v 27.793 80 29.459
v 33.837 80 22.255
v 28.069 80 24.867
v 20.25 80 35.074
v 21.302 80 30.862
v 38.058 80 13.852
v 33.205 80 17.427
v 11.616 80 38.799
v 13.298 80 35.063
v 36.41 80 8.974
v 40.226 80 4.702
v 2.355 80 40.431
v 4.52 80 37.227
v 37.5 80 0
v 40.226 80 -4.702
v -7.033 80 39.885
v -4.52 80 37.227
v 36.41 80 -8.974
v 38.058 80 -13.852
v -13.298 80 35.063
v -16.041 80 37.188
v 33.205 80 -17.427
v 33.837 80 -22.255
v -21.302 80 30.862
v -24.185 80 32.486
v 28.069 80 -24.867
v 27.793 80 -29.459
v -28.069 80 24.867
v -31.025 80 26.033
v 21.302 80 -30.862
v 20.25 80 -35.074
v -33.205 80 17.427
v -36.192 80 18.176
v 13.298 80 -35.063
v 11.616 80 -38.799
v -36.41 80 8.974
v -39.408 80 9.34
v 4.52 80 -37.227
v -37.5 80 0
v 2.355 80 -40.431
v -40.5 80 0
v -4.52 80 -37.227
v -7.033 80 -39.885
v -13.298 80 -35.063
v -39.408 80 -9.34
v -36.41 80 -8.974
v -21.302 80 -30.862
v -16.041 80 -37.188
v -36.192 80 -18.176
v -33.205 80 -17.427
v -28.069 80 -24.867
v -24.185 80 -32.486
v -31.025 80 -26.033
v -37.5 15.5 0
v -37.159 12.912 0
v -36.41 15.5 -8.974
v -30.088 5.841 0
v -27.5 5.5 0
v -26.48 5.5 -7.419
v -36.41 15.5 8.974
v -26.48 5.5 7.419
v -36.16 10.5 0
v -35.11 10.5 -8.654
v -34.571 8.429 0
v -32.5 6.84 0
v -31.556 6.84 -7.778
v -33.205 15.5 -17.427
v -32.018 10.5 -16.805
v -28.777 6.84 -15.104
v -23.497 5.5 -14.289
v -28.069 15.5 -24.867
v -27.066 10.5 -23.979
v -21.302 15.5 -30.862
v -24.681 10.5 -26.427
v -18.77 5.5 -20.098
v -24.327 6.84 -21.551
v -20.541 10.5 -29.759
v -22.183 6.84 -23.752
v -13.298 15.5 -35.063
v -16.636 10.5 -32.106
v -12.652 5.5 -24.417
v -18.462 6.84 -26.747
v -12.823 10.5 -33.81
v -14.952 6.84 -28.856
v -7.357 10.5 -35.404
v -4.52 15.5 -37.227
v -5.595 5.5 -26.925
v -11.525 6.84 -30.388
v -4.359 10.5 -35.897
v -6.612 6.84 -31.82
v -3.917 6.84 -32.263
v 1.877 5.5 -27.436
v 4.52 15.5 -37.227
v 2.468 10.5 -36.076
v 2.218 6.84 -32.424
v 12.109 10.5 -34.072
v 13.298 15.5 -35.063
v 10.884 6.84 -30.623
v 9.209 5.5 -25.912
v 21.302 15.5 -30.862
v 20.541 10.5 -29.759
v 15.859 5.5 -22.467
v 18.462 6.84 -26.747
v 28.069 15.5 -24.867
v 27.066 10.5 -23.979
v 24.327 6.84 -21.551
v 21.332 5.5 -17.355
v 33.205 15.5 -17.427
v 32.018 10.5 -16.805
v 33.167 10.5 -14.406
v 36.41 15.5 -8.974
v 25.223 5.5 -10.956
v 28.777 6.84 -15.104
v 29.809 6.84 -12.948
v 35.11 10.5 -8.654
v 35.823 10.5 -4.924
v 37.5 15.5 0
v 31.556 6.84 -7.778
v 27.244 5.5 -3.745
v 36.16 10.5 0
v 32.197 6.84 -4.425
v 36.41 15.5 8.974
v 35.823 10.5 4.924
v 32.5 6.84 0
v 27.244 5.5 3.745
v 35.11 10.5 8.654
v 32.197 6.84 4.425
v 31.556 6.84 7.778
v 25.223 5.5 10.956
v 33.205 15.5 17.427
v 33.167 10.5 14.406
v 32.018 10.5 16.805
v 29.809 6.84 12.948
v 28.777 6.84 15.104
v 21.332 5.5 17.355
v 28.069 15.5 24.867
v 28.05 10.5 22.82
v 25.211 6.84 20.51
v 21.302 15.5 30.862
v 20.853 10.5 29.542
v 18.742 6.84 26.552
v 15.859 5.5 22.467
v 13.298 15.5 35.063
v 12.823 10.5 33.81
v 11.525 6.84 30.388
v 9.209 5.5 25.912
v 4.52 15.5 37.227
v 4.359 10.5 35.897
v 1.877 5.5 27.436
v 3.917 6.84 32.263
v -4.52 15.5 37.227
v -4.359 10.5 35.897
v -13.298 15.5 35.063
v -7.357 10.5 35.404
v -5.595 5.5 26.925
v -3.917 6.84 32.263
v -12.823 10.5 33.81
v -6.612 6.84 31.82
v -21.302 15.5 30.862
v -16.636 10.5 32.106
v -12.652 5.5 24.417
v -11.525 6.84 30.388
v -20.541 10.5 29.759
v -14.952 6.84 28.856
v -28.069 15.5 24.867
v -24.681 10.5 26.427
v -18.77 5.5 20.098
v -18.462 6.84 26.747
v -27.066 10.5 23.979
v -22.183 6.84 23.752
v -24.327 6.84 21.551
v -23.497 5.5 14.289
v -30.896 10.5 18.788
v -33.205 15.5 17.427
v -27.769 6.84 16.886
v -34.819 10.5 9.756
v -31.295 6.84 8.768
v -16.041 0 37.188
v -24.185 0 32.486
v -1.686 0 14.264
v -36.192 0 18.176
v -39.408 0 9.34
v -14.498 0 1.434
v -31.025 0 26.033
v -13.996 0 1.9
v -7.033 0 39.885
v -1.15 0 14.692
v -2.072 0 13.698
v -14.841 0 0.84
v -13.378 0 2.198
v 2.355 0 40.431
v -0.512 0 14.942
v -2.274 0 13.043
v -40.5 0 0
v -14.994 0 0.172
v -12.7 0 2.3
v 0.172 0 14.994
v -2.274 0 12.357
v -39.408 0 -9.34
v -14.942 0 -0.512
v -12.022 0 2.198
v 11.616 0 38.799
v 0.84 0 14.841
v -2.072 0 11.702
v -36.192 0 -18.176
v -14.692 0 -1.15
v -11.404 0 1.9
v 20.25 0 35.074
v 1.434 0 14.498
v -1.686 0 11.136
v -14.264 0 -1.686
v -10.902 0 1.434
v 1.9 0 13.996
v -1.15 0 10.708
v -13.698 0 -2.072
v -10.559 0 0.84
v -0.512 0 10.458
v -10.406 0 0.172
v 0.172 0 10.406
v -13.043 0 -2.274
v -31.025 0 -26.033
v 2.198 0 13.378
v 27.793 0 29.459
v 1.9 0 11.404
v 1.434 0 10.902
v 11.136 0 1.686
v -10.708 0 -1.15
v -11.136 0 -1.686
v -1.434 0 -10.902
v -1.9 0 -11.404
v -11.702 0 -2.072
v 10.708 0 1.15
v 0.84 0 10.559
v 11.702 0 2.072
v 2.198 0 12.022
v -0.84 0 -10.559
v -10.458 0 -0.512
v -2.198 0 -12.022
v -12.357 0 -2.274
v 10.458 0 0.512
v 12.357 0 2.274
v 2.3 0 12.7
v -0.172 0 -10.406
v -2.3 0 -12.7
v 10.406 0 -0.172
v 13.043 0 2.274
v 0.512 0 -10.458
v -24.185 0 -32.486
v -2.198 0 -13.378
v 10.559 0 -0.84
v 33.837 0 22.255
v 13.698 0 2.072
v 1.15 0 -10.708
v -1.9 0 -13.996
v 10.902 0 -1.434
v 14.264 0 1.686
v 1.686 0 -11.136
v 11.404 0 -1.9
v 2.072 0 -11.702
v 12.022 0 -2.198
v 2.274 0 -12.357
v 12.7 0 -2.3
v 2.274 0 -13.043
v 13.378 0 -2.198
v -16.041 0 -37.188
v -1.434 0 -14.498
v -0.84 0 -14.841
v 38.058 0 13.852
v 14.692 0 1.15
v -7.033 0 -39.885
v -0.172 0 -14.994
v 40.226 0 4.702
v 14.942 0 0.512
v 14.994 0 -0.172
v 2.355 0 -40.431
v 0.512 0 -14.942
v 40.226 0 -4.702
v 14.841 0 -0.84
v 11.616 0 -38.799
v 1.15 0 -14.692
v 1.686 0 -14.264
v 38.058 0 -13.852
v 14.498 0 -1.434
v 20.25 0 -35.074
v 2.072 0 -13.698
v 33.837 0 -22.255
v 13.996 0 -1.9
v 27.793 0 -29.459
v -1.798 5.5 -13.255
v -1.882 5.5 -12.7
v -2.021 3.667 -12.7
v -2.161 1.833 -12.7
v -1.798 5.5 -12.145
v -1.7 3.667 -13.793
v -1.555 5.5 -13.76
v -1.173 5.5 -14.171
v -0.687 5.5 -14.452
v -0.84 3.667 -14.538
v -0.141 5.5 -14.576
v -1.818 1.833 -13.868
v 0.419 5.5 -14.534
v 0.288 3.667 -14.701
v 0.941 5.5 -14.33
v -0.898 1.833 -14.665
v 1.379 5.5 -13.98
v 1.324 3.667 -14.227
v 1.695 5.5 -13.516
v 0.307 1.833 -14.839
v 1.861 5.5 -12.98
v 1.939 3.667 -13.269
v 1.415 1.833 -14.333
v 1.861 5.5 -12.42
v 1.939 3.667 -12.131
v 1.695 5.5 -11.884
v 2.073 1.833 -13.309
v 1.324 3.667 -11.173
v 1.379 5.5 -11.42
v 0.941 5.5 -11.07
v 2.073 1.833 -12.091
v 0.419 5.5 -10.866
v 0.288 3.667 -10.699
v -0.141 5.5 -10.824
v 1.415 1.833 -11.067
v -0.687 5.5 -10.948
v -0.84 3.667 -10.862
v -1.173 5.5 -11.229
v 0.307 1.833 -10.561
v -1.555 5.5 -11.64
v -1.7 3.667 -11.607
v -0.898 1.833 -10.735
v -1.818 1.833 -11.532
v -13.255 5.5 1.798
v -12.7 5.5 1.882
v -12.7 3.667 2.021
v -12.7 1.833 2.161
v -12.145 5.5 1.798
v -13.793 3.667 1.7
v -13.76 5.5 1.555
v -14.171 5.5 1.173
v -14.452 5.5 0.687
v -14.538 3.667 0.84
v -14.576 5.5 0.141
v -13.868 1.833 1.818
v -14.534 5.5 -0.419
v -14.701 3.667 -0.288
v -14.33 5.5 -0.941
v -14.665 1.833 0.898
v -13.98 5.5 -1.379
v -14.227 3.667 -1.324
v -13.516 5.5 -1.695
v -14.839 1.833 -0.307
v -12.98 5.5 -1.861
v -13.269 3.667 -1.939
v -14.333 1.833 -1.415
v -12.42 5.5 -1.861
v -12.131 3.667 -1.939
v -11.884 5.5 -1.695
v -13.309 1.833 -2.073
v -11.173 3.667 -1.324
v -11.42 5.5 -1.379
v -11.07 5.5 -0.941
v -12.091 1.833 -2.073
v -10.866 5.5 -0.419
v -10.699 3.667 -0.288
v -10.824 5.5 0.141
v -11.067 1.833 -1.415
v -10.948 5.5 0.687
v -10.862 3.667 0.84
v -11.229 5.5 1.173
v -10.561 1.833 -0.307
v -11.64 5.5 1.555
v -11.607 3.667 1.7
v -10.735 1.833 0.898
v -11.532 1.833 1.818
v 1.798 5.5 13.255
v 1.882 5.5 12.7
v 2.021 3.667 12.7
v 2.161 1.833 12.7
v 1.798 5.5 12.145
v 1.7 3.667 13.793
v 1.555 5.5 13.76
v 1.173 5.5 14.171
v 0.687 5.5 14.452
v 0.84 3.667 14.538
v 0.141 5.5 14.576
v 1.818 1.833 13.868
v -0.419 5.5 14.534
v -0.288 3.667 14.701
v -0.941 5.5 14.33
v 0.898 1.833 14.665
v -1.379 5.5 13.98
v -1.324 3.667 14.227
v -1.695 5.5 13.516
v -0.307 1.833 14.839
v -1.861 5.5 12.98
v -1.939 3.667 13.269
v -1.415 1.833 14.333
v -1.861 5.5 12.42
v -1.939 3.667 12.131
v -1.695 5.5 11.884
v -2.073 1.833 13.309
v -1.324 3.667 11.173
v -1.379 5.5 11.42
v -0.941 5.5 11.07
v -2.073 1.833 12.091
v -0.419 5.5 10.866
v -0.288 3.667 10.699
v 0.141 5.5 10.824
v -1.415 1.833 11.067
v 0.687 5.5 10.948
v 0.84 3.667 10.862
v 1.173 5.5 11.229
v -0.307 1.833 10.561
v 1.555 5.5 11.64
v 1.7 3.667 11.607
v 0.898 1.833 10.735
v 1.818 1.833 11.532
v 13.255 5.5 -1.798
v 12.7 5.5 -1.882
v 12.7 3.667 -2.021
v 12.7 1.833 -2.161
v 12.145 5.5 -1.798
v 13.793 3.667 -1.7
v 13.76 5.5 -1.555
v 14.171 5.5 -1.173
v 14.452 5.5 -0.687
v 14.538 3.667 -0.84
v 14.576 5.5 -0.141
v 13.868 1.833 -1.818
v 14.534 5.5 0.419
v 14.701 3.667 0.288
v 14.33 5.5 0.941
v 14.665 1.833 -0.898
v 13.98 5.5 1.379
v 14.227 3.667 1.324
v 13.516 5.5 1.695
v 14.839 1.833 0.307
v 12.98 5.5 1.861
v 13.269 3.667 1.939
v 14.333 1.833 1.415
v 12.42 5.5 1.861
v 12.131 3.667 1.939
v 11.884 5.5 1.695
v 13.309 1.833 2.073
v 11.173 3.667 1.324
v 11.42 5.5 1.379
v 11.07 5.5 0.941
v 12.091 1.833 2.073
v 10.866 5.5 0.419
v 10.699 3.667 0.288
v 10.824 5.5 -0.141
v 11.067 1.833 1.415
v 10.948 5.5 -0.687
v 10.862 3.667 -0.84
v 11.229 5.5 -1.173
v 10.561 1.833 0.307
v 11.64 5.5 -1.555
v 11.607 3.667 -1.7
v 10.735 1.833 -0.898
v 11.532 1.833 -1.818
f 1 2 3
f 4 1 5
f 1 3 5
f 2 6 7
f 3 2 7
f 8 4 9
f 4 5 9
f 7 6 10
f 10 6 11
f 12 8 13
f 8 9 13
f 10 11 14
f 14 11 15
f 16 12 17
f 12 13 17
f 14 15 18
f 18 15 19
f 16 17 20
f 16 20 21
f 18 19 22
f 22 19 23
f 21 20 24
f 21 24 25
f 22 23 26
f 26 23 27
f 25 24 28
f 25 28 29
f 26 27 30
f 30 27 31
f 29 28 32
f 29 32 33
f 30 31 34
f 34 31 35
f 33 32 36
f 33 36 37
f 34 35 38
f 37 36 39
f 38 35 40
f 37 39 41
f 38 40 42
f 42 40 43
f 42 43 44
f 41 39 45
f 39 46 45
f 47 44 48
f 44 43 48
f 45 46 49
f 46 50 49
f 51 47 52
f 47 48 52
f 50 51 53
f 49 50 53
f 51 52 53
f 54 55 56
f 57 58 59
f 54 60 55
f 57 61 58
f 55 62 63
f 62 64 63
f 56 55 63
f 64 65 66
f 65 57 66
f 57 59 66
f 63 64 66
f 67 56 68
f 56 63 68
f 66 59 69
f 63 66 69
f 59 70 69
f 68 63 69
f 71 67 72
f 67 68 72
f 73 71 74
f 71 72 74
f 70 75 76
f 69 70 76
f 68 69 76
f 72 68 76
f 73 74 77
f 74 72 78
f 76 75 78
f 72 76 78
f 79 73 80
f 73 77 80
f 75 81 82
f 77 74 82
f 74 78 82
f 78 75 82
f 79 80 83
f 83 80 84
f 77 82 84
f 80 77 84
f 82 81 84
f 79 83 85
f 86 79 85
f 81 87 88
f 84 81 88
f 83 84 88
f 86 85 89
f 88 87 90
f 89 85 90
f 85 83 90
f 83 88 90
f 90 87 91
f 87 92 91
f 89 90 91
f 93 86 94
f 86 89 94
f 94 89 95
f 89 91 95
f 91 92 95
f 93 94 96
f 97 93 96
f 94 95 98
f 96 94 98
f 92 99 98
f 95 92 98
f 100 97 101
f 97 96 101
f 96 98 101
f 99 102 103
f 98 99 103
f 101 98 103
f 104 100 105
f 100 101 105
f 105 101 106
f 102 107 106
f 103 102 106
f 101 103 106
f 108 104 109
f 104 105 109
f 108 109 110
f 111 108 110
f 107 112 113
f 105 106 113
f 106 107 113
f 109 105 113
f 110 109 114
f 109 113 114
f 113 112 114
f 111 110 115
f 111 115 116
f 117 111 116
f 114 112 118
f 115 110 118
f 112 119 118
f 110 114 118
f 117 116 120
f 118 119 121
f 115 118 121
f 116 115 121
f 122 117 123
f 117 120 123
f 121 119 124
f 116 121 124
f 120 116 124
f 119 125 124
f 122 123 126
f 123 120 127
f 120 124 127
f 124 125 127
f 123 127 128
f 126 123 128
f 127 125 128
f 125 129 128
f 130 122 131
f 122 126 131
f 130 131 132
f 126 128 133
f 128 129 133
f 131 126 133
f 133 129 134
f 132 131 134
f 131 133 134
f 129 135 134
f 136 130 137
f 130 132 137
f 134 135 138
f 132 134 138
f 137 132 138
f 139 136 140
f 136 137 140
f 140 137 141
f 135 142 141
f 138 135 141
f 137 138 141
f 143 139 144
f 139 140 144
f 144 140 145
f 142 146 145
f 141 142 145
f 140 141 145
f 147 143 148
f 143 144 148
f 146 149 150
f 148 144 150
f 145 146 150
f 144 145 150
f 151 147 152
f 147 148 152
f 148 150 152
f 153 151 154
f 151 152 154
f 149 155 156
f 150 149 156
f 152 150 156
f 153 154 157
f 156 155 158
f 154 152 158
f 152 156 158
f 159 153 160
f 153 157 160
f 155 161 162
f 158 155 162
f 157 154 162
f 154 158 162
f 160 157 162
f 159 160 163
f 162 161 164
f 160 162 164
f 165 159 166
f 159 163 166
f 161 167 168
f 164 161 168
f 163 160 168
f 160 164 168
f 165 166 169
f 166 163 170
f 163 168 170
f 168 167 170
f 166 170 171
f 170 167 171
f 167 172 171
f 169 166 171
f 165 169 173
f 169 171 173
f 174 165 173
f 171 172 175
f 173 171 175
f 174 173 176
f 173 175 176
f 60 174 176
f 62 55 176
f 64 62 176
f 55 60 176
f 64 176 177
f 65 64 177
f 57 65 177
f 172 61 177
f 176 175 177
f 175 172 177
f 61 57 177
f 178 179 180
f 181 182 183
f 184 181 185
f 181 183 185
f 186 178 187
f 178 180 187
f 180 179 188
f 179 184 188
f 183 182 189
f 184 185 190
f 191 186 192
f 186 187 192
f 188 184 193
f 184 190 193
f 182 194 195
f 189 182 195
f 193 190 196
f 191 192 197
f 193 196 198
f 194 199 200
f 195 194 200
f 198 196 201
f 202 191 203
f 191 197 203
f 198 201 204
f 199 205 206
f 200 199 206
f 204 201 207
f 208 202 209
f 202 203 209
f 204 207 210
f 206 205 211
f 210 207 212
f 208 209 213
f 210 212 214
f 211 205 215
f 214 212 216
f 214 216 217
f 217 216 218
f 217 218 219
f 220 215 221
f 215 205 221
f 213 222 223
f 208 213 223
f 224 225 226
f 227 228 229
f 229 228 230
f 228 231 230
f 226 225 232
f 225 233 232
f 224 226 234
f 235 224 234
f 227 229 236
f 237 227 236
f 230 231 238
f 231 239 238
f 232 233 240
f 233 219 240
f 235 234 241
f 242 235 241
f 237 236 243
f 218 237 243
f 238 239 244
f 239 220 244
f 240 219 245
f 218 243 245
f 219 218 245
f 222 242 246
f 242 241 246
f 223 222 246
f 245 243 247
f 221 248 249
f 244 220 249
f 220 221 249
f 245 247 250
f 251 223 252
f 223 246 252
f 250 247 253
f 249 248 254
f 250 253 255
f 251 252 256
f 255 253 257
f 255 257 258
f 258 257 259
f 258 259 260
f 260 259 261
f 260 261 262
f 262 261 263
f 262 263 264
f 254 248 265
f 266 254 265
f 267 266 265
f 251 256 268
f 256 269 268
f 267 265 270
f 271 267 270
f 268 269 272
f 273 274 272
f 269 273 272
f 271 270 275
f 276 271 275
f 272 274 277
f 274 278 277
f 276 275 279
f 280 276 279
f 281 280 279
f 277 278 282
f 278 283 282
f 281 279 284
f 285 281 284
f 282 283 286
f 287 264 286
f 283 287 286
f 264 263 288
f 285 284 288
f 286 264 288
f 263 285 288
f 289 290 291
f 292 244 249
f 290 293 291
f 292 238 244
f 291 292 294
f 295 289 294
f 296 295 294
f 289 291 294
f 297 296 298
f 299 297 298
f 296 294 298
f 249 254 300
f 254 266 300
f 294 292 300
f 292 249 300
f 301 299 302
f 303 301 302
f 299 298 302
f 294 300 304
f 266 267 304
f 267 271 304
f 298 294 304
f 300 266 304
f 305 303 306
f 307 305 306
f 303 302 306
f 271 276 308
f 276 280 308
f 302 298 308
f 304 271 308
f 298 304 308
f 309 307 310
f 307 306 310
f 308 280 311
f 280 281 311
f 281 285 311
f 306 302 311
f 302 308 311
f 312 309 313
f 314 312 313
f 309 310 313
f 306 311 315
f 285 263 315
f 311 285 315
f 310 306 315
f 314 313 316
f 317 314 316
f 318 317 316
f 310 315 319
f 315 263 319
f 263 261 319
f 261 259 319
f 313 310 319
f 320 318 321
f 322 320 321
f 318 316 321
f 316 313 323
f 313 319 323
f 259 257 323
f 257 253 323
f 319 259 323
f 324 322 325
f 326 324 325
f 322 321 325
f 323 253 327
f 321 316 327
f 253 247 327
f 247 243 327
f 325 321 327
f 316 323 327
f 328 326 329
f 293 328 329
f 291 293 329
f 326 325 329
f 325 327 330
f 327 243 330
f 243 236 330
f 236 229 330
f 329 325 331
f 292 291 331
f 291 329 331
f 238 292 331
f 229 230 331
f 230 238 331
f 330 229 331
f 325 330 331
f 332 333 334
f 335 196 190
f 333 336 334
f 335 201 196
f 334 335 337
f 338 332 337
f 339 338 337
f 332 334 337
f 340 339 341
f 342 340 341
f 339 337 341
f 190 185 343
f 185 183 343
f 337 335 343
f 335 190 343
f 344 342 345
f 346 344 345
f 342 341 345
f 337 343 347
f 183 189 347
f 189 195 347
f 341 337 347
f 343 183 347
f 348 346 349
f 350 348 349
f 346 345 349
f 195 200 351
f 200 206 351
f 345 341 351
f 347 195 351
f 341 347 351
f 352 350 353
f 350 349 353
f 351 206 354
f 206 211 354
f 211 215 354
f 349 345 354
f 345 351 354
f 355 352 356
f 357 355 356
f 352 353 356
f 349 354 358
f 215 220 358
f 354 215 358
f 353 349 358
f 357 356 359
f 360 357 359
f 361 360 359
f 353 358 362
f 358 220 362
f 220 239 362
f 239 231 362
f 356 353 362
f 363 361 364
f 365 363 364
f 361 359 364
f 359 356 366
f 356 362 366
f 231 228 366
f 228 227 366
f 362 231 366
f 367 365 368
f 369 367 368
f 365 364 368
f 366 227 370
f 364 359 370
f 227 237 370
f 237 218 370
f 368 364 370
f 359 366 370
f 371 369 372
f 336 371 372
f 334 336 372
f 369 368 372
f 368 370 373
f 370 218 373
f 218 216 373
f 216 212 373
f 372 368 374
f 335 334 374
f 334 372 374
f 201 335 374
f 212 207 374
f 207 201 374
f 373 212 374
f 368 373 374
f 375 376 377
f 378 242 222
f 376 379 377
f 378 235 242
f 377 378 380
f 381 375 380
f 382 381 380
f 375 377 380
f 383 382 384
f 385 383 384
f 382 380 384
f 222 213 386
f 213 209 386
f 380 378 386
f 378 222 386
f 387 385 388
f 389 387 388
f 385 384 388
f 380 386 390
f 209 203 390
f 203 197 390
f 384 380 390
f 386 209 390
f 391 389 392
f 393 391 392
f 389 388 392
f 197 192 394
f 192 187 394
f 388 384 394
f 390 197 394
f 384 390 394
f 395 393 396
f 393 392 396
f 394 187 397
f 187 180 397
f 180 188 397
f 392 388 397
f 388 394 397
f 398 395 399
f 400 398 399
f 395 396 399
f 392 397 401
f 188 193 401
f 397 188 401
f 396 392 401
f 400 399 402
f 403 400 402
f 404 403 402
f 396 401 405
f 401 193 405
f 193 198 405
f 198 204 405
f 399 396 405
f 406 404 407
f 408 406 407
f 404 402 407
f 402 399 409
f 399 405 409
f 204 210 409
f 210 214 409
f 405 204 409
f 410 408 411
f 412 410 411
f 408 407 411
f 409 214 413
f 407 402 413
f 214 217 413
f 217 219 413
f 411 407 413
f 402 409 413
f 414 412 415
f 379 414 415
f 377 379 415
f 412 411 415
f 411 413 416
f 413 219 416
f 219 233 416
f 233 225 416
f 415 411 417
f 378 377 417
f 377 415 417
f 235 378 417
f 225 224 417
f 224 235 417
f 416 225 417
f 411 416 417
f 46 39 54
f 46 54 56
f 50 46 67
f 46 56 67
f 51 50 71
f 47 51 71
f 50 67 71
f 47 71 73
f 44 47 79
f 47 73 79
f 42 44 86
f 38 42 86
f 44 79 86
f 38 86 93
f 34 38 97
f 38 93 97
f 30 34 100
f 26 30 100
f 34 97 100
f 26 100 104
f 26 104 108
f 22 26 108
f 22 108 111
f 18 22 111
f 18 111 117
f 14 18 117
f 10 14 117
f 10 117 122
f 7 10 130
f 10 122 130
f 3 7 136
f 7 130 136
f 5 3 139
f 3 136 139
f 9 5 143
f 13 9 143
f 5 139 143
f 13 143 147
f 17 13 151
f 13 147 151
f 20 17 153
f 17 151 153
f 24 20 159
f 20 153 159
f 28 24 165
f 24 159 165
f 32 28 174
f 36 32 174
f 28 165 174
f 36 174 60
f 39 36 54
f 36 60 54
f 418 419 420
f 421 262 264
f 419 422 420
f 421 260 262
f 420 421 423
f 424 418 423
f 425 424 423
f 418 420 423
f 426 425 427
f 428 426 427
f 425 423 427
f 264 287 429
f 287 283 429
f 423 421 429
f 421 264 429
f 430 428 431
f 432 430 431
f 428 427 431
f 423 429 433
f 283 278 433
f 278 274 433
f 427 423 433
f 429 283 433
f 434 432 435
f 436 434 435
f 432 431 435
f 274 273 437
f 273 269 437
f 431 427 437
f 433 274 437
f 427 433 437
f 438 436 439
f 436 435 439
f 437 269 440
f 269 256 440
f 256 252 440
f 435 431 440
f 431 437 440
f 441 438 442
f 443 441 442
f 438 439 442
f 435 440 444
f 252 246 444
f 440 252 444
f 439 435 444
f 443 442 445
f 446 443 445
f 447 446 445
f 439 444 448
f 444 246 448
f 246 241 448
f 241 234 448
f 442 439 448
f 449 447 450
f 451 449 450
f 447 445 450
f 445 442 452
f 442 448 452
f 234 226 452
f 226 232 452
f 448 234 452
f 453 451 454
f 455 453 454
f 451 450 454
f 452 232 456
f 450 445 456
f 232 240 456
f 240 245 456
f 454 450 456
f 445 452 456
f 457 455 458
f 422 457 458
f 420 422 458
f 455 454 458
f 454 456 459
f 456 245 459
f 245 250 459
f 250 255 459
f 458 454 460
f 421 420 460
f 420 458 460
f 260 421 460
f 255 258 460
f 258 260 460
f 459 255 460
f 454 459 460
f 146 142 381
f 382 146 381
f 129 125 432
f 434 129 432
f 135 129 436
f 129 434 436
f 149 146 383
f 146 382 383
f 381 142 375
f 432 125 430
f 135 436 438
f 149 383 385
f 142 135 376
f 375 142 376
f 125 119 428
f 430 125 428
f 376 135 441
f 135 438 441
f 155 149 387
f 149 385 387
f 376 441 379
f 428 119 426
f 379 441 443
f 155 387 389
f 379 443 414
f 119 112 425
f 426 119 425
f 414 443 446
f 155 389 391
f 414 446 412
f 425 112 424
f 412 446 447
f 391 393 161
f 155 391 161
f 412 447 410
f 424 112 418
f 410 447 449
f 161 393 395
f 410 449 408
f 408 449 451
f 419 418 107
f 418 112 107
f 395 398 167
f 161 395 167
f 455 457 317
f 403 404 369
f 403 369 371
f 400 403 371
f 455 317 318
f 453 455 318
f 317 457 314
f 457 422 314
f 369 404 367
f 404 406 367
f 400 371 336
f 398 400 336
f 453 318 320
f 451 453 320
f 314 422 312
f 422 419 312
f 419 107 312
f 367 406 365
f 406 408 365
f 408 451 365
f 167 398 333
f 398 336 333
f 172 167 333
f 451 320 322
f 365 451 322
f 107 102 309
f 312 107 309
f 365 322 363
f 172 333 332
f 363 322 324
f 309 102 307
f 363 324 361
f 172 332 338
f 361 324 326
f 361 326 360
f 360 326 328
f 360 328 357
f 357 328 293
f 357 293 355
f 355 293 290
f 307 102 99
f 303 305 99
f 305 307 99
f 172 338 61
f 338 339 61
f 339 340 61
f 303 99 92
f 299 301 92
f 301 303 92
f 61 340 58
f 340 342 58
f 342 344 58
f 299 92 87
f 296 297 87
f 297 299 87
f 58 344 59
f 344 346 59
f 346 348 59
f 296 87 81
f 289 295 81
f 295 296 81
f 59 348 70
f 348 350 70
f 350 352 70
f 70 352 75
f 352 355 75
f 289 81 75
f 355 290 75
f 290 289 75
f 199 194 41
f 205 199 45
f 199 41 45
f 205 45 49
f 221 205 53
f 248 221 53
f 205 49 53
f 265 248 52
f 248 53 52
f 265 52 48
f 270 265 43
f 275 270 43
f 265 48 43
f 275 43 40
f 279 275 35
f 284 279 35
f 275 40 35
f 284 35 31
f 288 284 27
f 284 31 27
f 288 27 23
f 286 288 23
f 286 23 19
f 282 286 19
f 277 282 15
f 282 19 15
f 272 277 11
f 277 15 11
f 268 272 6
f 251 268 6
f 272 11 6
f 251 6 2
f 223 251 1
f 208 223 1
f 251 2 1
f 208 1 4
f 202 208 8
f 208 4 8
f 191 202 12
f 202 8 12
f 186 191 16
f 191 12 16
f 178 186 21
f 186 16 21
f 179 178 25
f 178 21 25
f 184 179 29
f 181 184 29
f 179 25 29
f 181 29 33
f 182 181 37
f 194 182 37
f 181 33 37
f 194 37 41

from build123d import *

# Parameters (mm, degrees)
SKETCH2_R                   = 2.3
CUT_EXTRUDE1_DEPTH          = 5.5
CUT_EXTRUDE1_DRAFT          = -4.35
CIRPATTERN1_COPY_1_SKETCH_R = 2.3
CIRPATTERN1_COPY_1_DEPTH    = 5.5
CIRPATTERN1_COPY_1_DRAFT    = -4.35
CIRPATTERN1_COPY_2_SKETCH_R = 2.3
CIRPATTERN1_COPY_2_DEPTH    = 5.5
CIRPATTERN1_COPY_2_DRAFT    = -4.35
CIRPATTERN1_COPY_3_SKETCH_R = 2.3
CIRPATTERN1_COPY_3_DEPTH    = 5.5
CIRPATTERN1_COPY_3_DRAFT    = -4.35


with BuildPart() as part:
    # Sketch1 → Revolve1 (revolve)
    with BuildSketch(Plane.XY):
        with BuildLine():
            Line((0, 0), (-40.5, 0))
            Line((-40.5, 0), (-40.5, 80))
            Line((-40.5, 80), (-37.5, 80))
            Line((-37.5, 80), (-37.5, 15.5))
            ThreePointArc((-37.5, 15.5), (-34.571067812, 8.428932188), (-27.5, 5.5))
            Line((-27.5, 5.5), (0, 5.5))
            Line((0, 5.5), (0, 0))
        make_face()
    revolve(axis=Axis((0, 5.5, 0), (0, -1, 0)))


with BuildPart() as cut_extrude1_tool:
    # Sketch2 → Cut-Extrude1 (with draft: the straight prism first)
    with BuildSketch(Plane.XZ):
        with Locations((0, 12.7)):
            Circle(SKETCH2_R)
    extrude(amount=-CUT_EXTRUDE1_DEPTH)
    # Cut-Extrude1: the draft: its side faces are tilted about the plane it starts from
    cut_extrude1_sides = [cut_extrude1_tool.faces().sort_by_distance(p)[0] for p in [
        (-2.3, 2.75, 12.7),
    ]]
    draft(cut_extrude1_sides, Plane.XZ, CUT_EXTRUDE1_DRAFT)


with BuildPart() as part_1:
    add(part.part)

    # Cut-Extrude1: cut by cut_extrude1_tool
    add(cut_extrude1_tool.part, mode=Mode.SUBTRACT)


with BuildPart() as cirpattern1_copy_1_tool:
    # CirPattern1 copy 1 sketch → CirPattern1 copy 1 (with draft: the straight prism first)
    with BuildSketch(Plane(origin=(0, 0, 0), x_dir=(0, 0, -1), z_dir=(0, -1, 0))):
        with Locations((0, 12.7)):
            Circle(CIRPATTERN1_COPY_1_SKETCH_R)
    extrude(amount=-CIRPATTERN1_COPY_1_DEPTH)
    # CirPattern1 copy 1: the draft: its side faces are tilted about the plane it starts from
    cirpattern1_copy_1_sides = [cirpattern1_copy_1_tool.faces().sort_by_distance(p)[0] for p in [
        (12.7, 2.75, 2.3),
    ]]
    draft(cirpattern1_copy_1_sides, Plane(origin=(0, 0, 0), x_dir=(0, 0, -1), z_dir=(0, -1, 0)), CIRPATTERN1_COPY_1_DRAFT)


with BuildPart() as part_2:
    add(part_1.part)

    # CirPattern1 copy 1: cut by cirpattern1_copy_1_tool
    add(cirpattern1_copy_1_tool.part, mode=Mode.SUBTRACT)


with BuildPart() as cirpattern1_copy_2_tool:
    # CirPattern1 copy 2 sketch → CirPattern1 copy 2 (with draft: the straight prism first)
    with BuildSketch(Plane(origin=(0, 0, 0), x_dir=(-1, 0, 0), z_dir=(0, -1, 0))):
        with Locations((0, 12.7)):
            Circle(CIRPATTERN1_COPY_2_SKETCH_R)
    extrude(amount=-CIRPATTERN1_COPY_2_DEPTH)
    # CirPattern1 copy 2: the draft: its side faces are tilted about the plane it starts from
    cirpattern1_copy_2_sides = [cirpattern1_copy_2_tool.faces().sort_by_distance(p)[0] for p in [
        (2.3, 2.75, -12.7),
    ]]
    draft(cirpattern1_copy_2_sides, Plane(origin=(0, 0, 0), x_dir=(-1, 0, 0), z_dir=(0, -1, 0)), CIRPATTERN1_COPY_2_DRAFT)


with BuildPart() as part_3:
    add(part_2.part)

    # CirPattern1 copy 2: cut by cirpattern1_copy_2_tool
    add(cirpattern1_copy_2_tool.part, mode=Mode.SUBTRACT)


with BuildPart() as cirpattern1_copy_3_tool:
    # CirPattern1 copy 3 sketch → CirPattern1 copy 3 (with draft: the straight prism first)
    with BuildSketch(Plane(origin=(0, 0, 0), x_dir=(0, 0, 1), z_dir=(0, -1, 0))):
        with Locations((0, 12.7)):
            Circle(CIRPATTERN1_COPY_3_SKETCH_R)
    extrude(amount=-CIRPATTERN1_COPY_3_DEPTH)
    # CirPattern1 copy 3: the draft: its side faces are tilted about the plane it starts from
    cirpattern1_copy_3_sides = [cirpattern1_copy_3_tool.faces().sort_by_distance(p)[0] for p in [
        (-12.7, 2.75, -2.3),
    ]]
    draft(cirpattern1_copy_3_sides, Plane(origin=(0, 0, 0), x_dir=(0, 0, 1), z_dir=(0, -1, 0)), CIRPATTERN1_COPY_3_DRAFT)


with BuildPart() as part_4:
    add(part_3.part)

    # CirPattern1 copy 3: cut by cirpattern1_copy_3_tool
    add(cirpattern1_copy_3_tool.part, mode=Mode.SUBTRACT)


solid = part_4.part
